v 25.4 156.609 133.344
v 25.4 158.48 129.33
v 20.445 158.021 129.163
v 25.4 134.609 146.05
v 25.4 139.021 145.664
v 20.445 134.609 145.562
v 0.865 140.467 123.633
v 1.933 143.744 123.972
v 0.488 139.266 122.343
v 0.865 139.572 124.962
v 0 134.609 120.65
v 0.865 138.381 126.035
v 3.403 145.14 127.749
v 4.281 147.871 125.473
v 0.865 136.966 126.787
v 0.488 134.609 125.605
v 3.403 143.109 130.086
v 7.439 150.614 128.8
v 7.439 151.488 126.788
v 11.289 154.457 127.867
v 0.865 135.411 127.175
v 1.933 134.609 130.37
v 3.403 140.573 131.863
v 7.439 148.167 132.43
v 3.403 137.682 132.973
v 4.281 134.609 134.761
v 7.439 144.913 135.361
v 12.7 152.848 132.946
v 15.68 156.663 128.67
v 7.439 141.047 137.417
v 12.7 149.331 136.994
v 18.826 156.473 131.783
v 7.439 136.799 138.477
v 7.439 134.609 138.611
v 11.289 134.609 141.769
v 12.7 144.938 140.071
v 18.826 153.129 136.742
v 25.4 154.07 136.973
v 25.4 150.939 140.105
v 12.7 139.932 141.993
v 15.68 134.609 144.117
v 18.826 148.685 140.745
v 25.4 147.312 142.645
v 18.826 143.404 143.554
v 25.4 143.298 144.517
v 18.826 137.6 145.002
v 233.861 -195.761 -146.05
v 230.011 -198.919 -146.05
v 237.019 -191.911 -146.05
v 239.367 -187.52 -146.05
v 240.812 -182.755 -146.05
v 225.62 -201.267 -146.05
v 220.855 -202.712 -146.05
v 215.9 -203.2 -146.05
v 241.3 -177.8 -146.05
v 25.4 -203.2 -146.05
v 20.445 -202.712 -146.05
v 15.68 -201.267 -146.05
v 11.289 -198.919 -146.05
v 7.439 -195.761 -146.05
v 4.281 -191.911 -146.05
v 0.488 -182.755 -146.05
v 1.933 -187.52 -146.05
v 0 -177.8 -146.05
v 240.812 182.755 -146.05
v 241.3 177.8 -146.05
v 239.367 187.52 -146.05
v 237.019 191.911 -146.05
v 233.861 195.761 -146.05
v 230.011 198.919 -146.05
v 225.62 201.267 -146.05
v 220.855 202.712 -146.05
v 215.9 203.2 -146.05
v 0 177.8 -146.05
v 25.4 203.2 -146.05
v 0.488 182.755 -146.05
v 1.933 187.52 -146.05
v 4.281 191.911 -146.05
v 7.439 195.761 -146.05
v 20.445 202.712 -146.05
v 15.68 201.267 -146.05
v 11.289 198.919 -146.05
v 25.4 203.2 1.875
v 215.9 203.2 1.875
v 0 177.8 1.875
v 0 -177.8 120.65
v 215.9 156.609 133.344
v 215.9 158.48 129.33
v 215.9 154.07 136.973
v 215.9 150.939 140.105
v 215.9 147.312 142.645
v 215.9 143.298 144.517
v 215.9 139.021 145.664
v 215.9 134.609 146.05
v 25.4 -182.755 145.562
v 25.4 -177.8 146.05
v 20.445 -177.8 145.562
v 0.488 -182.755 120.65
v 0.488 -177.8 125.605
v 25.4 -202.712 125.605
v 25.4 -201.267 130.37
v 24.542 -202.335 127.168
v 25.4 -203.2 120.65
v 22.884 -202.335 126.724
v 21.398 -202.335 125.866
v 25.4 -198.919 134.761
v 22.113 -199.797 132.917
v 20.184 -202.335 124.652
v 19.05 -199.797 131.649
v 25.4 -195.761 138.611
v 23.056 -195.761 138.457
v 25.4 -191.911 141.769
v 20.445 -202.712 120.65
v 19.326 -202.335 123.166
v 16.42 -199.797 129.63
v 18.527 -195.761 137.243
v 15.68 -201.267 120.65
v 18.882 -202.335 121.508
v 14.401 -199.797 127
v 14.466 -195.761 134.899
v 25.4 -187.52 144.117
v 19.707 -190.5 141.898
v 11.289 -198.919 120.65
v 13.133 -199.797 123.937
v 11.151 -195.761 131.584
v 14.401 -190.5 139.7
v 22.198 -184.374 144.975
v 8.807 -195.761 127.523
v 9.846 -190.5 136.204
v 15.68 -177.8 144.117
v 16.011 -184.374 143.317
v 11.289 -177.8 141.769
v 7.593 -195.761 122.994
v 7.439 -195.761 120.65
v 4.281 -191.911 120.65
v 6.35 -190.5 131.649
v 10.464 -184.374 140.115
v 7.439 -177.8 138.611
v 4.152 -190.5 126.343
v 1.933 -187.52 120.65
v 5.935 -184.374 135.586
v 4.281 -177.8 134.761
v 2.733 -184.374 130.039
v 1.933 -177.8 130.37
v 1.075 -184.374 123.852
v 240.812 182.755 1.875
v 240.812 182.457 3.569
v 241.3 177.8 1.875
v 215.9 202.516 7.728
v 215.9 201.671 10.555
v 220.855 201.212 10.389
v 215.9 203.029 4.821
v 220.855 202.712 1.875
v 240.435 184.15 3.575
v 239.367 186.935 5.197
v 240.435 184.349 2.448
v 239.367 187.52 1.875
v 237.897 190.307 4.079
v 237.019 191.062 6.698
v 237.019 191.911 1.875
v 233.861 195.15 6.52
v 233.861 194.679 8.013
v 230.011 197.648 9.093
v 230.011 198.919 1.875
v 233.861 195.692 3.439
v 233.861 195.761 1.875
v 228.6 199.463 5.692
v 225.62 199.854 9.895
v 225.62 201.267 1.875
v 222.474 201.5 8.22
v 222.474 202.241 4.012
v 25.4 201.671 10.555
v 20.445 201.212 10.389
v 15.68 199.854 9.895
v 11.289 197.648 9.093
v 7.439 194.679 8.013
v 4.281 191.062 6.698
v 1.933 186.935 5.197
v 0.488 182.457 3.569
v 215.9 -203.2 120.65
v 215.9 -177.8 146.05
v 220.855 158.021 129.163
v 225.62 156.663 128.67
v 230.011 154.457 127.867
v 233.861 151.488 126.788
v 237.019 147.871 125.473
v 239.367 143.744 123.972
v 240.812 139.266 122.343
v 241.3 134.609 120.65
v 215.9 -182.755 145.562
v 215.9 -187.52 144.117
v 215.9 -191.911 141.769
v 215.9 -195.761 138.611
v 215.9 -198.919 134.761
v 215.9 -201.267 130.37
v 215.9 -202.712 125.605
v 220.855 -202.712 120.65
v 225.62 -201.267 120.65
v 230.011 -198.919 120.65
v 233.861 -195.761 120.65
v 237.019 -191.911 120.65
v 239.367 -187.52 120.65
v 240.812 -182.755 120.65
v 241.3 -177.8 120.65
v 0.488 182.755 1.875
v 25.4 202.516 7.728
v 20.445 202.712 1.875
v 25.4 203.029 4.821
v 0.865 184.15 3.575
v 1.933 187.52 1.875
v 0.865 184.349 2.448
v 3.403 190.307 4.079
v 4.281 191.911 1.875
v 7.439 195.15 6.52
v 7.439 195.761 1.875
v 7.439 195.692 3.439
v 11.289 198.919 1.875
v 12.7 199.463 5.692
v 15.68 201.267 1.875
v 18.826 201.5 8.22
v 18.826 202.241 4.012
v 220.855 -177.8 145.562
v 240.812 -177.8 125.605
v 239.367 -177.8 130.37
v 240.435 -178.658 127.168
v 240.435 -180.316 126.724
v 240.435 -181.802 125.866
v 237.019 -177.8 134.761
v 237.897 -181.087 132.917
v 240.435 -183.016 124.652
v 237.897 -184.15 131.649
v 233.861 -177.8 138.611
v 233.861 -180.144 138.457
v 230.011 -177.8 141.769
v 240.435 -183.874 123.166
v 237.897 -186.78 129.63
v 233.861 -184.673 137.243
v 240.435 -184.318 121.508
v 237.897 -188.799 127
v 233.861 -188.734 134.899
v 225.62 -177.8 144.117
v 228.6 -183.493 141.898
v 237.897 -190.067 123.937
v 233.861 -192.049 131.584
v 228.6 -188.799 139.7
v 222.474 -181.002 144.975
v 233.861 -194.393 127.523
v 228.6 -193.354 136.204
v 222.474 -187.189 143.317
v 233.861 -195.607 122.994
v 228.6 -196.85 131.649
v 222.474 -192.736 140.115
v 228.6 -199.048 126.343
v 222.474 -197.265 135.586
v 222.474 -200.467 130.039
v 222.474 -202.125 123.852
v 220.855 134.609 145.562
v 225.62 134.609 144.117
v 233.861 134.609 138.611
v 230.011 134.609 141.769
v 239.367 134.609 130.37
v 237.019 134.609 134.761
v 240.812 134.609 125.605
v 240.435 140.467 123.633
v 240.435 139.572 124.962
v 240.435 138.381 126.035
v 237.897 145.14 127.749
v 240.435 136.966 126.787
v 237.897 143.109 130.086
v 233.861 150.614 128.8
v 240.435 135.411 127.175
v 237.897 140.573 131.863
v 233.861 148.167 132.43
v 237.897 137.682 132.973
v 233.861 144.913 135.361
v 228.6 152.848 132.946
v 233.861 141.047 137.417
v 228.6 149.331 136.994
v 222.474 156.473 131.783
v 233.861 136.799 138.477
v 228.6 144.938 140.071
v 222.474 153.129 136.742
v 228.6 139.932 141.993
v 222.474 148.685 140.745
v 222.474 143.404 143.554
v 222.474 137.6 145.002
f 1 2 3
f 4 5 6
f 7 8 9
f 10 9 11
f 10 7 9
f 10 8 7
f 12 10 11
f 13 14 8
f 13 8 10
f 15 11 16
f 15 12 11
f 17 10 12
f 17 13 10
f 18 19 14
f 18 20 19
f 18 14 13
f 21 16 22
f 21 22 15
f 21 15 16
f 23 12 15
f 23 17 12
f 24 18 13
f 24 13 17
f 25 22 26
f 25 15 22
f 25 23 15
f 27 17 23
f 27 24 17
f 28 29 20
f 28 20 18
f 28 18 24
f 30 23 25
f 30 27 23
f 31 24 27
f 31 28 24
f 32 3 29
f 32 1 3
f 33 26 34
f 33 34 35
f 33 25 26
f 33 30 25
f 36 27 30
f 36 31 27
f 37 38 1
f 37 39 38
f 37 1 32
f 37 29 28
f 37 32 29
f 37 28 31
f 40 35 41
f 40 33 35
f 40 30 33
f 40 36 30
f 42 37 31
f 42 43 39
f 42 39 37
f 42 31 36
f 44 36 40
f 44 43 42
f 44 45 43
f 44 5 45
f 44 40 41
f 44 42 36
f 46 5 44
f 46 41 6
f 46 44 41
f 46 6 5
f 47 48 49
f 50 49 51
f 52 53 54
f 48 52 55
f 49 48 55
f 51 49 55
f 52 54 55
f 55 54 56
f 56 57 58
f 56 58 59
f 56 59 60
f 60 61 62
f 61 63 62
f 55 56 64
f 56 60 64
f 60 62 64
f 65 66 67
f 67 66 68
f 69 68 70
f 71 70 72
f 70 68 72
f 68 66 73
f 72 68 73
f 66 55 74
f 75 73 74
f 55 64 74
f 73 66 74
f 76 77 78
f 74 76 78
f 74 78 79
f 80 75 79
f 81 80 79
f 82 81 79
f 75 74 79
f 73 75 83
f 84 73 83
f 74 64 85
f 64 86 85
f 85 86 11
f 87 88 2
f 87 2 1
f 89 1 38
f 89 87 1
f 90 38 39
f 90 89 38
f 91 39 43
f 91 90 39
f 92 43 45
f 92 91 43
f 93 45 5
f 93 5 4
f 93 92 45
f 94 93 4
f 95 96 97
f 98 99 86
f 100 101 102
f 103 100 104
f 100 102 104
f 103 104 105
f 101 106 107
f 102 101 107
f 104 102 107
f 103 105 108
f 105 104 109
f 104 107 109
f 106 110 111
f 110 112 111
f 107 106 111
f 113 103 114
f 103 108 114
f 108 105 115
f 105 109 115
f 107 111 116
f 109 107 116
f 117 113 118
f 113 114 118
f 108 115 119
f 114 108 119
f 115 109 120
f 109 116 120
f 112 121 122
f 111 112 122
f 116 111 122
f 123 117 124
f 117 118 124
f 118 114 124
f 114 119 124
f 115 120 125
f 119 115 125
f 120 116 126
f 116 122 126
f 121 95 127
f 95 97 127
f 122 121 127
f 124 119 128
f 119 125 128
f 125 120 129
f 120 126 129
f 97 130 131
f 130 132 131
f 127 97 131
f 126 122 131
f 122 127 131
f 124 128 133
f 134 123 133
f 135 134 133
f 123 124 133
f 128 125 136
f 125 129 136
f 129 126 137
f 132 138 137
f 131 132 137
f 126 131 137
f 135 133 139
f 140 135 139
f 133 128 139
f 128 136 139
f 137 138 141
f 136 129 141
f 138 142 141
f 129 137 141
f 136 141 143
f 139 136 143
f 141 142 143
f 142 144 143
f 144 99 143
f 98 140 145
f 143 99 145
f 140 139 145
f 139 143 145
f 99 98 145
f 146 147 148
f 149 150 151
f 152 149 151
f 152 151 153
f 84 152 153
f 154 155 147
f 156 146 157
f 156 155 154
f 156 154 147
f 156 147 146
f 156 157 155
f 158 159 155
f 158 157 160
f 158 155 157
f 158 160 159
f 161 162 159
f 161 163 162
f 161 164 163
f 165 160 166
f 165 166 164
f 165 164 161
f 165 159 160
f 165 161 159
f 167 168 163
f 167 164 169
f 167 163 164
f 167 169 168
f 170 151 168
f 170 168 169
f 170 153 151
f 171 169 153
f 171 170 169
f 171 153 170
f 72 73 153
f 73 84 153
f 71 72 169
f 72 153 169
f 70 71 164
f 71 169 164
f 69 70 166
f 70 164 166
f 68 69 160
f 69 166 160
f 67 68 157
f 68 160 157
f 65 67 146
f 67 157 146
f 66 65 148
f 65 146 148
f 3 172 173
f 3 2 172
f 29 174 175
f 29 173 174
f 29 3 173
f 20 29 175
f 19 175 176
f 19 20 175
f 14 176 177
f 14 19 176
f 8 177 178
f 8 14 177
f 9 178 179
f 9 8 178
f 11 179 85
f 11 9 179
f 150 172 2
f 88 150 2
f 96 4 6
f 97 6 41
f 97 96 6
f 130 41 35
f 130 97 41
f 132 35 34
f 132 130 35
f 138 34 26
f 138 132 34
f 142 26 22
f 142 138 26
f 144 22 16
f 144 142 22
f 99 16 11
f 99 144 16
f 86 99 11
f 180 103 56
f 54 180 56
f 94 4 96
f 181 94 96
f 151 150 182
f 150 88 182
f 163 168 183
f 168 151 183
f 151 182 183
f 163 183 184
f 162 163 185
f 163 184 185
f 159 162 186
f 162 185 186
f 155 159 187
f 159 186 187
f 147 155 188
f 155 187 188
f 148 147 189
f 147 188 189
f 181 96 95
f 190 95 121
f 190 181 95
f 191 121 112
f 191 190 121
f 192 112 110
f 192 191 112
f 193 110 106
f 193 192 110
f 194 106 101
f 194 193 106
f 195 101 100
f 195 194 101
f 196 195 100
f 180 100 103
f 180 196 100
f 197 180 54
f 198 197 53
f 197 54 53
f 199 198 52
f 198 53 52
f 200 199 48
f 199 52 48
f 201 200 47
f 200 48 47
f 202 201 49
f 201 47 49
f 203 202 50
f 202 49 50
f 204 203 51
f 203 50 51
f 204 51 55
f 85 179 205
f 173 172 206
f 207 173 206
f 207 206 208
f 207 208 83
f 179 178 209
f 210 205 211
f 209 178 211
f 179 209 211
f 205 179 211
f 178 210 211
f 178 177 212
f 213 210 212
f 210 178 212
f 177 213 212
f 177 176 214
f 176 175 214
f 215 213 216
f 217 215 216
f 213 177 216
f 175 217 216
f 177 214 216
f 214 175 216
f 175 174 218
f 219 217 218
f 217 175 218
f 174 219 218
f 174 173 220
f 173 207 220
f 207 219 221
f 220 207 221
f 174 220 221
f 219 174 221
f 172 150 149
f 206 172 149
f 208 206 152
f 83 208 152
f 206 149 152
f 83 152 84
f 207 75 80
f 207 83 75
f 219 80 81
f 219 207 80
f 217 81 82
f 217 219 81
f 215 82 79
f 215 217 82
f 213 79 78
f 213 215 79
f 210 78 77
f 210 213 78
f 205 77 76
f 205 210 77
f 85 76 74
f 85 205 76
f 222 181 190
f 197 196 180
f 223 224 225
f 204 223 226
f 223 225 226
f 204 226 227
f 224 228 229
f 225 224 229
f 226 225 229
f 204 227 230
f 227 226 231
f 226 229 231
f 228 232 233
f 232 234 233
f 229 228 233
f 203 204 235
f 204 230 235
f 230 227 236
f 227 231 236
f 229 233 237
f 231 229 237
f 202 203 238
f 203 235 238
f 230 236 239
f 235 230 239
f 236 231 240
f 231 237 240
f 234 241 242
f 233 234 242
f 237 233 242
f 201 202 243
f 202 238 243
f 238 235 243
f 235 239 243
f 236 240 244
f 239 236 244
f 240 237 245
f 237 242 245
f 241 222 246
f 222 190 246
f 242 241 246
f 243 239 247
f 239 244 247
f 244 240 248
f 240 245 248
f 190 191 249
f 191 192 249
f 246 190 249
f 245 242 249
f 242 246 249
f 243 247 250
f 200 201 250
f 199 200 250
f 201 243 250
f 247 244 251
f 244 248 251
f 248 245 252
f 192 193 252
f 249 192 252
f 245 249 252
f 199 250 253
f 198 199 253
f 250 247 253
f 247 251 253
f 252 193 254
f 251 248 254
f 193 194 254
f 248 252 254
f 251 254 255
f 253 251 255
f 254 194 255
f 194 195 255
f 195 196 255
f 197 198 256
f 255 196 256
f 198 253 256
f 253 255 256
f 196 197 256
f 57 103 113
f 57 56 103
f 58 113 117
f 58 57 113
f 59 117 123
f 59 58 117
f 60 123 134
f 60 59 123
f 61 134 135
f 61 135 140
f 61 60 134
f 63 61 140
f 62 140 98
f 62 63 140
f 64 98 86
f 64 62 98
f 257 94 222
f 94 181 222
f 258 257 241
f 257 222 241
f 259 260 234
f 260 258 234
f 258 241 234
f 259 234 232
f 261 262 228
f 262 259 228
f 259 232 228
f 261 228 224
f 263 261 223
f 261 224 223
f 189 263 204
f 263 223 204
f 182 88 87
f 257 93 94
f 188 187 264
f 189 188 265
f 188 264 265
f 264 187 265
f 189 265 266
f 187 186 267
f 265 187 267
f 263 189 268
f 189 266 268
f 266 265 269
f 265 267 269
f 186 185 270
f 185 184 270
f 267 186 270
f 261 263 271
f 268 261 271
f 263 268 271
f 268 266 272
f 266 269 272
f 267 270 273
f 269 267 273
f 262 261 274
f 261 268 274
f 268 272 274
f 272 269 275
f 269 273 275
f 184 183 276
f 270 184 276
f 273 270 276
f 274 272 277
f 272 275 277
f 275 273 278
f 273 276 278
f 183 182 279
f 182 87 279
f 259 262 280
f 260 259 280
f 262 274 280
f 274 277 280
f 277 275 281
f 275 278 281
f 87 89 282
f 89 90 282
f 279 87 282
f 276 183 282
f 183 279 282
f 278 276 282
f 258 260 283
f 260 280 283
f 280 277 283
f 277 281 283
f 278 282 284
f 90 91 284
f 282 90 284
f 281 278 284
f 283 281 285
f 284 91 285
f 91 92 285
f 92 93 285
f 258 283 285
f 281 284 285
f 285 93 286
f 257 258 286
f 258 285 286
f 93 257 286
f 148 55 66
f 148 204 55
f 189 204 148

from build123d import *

# Parameters (mm, degrees)
F1_DEPTH = 241.3
F2_R     = 25.4


with BuildPart() as f1:
    # F0 (on Right) → F1 (new body)
    with BuildSketch(Plane.YZ):
        Polygon((203.2, 6.35), (152.4, 146.05), (-203.2, 146.05), (-203.2, -146.05), (203.2, -146.05), align=None)
    extrude(amount=F1_DEPTH)

    # F2
    f2_edges = [f1.edges().sort_by_distance(p)[0] for p in [
        (0, -25.4, 146.05),
        (120.65, -203.2, 146.05),
        (241.3, -25.4, 146.05),
        (120.65, 152.4, 146.05),
        (0, 177.8, 76.2),
        (0, 203.2, -69.85),
        (0, -203.2, 0),
        (241.3, -203.2, 0),
        (241.3, 177.8, 76.2),
        (241.3, 203.2, -69.85),
        (120.65, 203.2, 6.35),
    ]]
    fillet(f2_edges, radius=F2_R)


solid = f1.part
